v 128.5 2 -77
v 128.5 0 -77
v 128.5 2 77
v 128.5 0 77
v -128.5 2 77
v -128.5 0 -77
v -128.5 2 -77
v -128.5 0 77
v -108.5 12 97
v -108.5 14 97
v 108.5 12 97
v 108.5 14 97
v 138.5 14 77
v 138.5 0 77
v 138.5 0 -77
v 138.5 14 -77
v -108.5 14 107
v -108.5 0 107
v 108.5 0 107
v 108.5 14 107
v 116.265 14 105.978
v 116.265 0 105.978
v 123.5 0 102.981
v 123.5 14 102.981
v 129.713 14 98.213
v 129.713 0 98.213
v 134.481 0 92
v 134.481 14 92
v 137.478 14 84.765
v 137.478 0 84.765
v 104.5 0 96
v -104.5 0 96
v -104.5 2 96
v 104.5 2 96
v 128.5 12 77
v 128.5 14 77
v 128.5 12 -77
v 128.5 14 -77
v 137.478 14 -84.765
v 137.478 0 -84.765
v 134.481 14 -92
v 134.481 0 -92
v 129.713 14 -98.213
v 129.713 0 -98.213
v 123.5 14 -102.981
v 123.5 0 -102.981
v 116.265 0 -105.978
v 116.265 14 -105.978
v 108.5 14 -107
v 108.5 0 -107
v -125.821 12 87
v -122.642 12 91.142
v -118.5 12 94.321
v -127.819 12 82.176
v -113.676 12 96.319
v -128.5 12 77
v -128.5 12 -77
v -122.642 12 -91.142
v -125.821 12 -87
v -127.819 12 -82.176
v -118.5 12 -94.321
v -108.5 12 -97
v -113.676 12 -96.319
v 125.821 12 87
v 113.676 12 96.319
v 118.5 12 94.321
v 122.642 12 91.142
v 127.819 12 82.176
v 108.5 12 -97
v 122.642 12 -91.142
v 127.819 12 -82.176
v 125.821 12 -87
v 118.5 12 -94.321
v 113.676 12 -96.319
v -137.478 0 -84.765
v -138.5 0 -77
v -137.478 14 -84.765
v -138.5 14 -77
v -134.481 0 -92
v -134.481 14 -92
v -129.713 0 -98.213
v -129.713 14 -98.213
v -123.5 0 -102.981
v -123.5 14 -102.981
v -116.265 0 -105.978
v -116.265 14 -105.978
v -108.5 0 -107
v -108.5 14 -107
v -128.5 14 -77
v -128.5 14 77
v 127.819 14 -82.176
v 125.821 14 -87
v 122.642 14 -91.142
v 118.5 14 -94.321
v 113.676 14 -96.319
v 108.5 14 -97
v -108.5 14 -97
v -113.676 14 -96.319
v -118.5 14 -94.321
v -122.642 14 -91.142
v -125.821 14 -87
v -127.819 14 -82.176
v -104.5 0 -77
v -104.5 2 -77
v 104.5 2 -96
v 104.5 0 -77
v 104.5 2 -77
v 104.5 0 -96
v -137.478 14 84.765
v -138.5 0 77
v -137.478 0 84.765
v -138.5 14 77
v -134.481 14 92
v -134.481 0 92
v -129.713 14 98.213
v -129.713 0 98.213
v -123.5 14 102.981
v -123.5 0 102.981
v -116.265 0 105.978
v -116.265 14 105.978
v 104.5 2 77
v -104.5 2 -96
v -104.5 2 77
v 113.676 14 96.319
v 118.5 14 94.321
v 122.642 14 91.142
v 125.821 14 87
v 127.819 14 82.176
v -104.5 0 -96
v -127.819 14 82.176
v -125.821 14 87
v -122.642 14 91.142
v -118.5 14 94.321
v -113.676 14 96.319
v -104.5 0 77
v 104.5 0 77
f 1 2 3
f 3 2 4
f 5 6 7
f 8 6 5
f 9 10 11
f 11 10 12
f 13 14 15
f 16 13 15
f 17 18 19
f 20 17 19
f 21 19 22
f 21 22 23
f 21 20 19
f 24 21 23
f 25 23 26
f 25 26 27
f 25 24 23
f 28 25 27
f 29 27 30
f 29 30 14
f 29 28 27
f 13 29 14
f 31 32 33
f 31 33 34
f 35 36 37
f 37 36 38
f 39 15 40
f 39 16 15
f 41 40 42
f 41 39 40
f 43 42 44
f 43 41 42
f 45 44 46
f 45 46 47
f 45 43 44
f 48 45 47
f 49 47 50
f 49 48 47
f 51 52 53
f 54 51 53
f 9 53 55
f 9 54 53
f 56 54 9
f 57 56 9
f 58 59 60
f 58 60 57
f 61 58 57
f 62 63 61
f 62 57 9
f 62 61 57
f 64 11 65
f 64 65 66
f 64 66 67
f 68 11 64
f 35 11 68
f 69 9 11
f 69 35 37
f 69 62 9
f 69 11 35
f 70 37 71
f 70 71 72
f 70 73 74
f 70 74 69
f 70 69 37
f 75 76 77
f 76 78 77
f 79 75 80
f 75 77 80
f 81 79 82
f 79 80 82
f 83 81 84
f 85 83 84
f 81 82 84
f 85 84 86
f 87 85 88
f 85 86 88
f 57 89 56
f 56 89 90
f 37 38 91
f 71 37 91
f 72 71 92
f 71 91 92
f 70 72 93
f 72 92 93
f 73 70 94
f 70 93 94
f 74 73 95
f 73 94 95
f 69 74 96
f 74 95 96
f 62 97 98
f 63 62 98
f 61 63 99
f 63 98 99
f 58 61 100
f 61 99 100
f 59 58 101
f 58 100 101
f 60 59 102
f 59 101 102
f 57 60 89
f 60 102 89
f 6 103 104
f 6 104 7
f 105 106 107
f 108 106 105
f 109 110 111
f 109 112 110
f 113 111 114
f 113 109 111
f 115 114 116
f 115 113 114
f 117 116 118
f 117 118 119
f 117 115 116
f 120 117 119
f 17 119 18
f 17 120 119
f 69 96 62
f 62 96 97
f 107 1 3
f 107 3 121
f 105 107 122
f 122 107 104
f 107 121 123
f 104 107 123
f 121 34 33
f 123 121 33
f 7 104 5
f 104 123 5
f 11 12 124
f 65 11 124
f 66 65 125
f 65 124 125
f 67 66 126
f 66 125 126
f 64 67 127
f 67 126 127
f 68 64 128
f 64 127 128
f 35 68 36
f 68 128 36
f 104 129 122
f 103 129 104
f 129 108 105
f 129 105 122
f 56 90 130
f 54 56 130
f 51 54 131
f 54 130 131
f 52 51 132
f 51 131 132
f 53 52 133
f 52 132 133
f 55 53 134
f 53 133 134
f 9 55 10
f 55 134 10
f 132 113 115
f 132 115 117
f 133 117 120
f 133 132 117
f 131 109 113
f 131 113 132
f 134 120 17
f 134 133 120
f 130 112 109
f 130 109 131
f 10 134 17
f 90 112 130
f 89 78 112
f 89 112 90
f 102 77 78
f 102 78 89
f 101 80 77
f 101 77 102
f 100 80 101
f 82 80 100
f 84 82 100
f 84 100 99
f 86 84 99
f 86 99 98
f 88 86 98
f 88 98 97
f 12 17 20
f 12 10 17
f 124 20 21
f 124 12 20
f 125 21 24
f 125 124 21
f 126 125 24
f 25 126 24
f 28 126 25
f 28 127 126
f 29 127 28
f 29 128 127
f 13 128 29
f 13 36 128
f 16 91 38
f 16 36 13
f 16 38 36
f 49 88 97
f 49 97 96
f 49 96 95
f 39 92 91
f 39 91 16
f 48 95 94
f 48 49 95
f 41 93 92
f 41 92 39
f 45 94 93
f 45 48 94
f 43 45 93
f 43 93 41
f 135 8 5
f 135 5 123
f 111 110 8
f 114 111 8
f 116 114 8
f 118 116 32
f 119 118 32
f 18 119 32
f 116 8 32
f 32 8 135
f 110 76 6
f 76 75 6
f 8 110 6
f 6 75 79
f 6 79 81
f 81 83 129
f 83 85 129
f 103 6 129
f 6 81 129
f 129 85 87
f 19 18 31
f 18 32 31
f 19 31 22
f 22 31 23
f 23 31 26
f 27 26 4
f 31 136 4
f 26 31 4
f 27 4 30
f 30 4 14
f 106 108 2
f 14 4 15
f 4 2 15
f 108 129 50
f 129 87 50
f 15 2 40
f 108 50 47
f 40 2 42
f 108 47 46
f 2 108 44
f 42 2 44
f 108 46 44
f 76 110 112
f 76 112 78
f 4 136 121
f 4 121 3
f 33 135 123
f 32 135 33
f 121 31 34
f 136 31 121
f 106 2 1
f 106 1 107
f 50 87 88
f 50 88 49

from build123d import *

# Parameters (mm, degrees)
SKETCH3_W           = 277
SKETCH3_H           = 214
BOSS_EXTRUDE1_DEPTH = 14
FILLET1_R           = 30
CUT_EXTRUDE1_DEPTH  = 2
CUT_EXTRUDE2_DEPTH  = 2


with BuildPart() as part:
    # Sketch3 → Boss-Extrude1 (new body)
    with BuildSketch(Plane(origin=(0, 0, 0), x_dir=(1, 0, 0), z_dir=(0, 1, 0))):
        Rectangle(SKETCH3_W, SKETCH3_H)
    extrude(amount=BOSS_EXTRUDE1_DEPTH)

    # Fillet1
    fillet1_edges = [part.edges().sort_by_distance(p)[0] for p in [
        (138.5, 7, 107),
        (-138.5, 7, 107),
        (-138.5, 7, -107),
        (138.5, 7, -107),
    ]]
    fillet(fillet1_edges, radius=FILLET1_R)

    # Sketch4 → Cut-Extrude1 (cut)
    with BuildSketch(Plane(origin=(0, 14, 0), x_dir=(1, 0, 0), z_dir=(0, 1, 0))):
        with BuildLine():
            Line((-128.5, 77), (-128.5, -77))
            ThreePointArc((-128.5, -77), (-122.642135624, -91.142135624), (-108.5, -97))
            Line((-108.5, -97), (108.5, -97))
            ThreePointArc((108.5, -97), (122.642135624, -91.142135624), (128.5, -77))
            Line((128.5, -77), (128.5, 77))
            ThreePointArc((128.5, 77), (122.642135624, 91.142135624), (108.5, 97))
            Line((108.5, 97), (-108.5, 97))
            ThreePointArc((-108.5, 97), (-122.642135624, 91.142135624), (-128.5, 77))
        make_face()
    extrude(amount=-CUT_EXTRUDE1_DEPTH, mode=Mode.SUBTRACT)

    # Sketch5 → Cut-Extrude2 (cut)
    with BuildSketch(Plane.XZ):
        Polygon((-104.5, 96), (104.5, 96), (104.5, 77), (128.5, 77), (128.5, 0), (128.5, -77), (104.5, -77), (104.5, -96), (-104.5, -96), (-104.5, -77), (-128.5, -77), (-128.5, 77), (-104.5, 77), align=None)
    extrude(amount=-CUT_EXTRUDE2_DEPTH, mode=Mode.SUBTRACT)


solid = part.part
